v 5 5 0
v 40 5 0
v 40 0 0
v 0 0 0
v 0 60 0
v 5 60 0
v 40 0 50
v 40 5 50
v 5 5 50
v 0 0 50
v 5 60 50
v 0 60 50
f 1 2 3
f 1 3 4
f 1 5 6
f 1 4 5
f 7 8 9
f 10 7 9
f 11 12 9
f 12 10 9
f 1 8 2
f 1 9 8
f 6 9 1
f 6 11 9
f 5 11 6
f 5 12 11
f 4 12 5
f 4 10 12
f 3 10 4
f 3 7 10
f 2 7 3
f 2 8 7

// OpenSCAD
$fn = 32;

// ----------------------------------------------------------------------
// Structural section: angle 40 x 60 mm
// ----------------------------------------------------------------------

// --- parameters (mm) ---
sec_w = 40;               // leg width, X
sec_h = 60;               // leg height, Y
flange_t = 5;             // leg thickness
plate_t = 50;             // cut length, Z (extrusion height)
fit_tol = 0.02;           // declared fit tolerance (prompt contract)
free_tol = 0.2;           // declared free tolerance (prompt contract)

profile = [[0, 0], [40, 0], [40, 5], [5, 5], [5, 60], [0, 60]];  // primary outline, 6 points, counter clockwise

// --- the one profile operation ---
linear_extrude(height = plate_t) polygon(points = profile);
